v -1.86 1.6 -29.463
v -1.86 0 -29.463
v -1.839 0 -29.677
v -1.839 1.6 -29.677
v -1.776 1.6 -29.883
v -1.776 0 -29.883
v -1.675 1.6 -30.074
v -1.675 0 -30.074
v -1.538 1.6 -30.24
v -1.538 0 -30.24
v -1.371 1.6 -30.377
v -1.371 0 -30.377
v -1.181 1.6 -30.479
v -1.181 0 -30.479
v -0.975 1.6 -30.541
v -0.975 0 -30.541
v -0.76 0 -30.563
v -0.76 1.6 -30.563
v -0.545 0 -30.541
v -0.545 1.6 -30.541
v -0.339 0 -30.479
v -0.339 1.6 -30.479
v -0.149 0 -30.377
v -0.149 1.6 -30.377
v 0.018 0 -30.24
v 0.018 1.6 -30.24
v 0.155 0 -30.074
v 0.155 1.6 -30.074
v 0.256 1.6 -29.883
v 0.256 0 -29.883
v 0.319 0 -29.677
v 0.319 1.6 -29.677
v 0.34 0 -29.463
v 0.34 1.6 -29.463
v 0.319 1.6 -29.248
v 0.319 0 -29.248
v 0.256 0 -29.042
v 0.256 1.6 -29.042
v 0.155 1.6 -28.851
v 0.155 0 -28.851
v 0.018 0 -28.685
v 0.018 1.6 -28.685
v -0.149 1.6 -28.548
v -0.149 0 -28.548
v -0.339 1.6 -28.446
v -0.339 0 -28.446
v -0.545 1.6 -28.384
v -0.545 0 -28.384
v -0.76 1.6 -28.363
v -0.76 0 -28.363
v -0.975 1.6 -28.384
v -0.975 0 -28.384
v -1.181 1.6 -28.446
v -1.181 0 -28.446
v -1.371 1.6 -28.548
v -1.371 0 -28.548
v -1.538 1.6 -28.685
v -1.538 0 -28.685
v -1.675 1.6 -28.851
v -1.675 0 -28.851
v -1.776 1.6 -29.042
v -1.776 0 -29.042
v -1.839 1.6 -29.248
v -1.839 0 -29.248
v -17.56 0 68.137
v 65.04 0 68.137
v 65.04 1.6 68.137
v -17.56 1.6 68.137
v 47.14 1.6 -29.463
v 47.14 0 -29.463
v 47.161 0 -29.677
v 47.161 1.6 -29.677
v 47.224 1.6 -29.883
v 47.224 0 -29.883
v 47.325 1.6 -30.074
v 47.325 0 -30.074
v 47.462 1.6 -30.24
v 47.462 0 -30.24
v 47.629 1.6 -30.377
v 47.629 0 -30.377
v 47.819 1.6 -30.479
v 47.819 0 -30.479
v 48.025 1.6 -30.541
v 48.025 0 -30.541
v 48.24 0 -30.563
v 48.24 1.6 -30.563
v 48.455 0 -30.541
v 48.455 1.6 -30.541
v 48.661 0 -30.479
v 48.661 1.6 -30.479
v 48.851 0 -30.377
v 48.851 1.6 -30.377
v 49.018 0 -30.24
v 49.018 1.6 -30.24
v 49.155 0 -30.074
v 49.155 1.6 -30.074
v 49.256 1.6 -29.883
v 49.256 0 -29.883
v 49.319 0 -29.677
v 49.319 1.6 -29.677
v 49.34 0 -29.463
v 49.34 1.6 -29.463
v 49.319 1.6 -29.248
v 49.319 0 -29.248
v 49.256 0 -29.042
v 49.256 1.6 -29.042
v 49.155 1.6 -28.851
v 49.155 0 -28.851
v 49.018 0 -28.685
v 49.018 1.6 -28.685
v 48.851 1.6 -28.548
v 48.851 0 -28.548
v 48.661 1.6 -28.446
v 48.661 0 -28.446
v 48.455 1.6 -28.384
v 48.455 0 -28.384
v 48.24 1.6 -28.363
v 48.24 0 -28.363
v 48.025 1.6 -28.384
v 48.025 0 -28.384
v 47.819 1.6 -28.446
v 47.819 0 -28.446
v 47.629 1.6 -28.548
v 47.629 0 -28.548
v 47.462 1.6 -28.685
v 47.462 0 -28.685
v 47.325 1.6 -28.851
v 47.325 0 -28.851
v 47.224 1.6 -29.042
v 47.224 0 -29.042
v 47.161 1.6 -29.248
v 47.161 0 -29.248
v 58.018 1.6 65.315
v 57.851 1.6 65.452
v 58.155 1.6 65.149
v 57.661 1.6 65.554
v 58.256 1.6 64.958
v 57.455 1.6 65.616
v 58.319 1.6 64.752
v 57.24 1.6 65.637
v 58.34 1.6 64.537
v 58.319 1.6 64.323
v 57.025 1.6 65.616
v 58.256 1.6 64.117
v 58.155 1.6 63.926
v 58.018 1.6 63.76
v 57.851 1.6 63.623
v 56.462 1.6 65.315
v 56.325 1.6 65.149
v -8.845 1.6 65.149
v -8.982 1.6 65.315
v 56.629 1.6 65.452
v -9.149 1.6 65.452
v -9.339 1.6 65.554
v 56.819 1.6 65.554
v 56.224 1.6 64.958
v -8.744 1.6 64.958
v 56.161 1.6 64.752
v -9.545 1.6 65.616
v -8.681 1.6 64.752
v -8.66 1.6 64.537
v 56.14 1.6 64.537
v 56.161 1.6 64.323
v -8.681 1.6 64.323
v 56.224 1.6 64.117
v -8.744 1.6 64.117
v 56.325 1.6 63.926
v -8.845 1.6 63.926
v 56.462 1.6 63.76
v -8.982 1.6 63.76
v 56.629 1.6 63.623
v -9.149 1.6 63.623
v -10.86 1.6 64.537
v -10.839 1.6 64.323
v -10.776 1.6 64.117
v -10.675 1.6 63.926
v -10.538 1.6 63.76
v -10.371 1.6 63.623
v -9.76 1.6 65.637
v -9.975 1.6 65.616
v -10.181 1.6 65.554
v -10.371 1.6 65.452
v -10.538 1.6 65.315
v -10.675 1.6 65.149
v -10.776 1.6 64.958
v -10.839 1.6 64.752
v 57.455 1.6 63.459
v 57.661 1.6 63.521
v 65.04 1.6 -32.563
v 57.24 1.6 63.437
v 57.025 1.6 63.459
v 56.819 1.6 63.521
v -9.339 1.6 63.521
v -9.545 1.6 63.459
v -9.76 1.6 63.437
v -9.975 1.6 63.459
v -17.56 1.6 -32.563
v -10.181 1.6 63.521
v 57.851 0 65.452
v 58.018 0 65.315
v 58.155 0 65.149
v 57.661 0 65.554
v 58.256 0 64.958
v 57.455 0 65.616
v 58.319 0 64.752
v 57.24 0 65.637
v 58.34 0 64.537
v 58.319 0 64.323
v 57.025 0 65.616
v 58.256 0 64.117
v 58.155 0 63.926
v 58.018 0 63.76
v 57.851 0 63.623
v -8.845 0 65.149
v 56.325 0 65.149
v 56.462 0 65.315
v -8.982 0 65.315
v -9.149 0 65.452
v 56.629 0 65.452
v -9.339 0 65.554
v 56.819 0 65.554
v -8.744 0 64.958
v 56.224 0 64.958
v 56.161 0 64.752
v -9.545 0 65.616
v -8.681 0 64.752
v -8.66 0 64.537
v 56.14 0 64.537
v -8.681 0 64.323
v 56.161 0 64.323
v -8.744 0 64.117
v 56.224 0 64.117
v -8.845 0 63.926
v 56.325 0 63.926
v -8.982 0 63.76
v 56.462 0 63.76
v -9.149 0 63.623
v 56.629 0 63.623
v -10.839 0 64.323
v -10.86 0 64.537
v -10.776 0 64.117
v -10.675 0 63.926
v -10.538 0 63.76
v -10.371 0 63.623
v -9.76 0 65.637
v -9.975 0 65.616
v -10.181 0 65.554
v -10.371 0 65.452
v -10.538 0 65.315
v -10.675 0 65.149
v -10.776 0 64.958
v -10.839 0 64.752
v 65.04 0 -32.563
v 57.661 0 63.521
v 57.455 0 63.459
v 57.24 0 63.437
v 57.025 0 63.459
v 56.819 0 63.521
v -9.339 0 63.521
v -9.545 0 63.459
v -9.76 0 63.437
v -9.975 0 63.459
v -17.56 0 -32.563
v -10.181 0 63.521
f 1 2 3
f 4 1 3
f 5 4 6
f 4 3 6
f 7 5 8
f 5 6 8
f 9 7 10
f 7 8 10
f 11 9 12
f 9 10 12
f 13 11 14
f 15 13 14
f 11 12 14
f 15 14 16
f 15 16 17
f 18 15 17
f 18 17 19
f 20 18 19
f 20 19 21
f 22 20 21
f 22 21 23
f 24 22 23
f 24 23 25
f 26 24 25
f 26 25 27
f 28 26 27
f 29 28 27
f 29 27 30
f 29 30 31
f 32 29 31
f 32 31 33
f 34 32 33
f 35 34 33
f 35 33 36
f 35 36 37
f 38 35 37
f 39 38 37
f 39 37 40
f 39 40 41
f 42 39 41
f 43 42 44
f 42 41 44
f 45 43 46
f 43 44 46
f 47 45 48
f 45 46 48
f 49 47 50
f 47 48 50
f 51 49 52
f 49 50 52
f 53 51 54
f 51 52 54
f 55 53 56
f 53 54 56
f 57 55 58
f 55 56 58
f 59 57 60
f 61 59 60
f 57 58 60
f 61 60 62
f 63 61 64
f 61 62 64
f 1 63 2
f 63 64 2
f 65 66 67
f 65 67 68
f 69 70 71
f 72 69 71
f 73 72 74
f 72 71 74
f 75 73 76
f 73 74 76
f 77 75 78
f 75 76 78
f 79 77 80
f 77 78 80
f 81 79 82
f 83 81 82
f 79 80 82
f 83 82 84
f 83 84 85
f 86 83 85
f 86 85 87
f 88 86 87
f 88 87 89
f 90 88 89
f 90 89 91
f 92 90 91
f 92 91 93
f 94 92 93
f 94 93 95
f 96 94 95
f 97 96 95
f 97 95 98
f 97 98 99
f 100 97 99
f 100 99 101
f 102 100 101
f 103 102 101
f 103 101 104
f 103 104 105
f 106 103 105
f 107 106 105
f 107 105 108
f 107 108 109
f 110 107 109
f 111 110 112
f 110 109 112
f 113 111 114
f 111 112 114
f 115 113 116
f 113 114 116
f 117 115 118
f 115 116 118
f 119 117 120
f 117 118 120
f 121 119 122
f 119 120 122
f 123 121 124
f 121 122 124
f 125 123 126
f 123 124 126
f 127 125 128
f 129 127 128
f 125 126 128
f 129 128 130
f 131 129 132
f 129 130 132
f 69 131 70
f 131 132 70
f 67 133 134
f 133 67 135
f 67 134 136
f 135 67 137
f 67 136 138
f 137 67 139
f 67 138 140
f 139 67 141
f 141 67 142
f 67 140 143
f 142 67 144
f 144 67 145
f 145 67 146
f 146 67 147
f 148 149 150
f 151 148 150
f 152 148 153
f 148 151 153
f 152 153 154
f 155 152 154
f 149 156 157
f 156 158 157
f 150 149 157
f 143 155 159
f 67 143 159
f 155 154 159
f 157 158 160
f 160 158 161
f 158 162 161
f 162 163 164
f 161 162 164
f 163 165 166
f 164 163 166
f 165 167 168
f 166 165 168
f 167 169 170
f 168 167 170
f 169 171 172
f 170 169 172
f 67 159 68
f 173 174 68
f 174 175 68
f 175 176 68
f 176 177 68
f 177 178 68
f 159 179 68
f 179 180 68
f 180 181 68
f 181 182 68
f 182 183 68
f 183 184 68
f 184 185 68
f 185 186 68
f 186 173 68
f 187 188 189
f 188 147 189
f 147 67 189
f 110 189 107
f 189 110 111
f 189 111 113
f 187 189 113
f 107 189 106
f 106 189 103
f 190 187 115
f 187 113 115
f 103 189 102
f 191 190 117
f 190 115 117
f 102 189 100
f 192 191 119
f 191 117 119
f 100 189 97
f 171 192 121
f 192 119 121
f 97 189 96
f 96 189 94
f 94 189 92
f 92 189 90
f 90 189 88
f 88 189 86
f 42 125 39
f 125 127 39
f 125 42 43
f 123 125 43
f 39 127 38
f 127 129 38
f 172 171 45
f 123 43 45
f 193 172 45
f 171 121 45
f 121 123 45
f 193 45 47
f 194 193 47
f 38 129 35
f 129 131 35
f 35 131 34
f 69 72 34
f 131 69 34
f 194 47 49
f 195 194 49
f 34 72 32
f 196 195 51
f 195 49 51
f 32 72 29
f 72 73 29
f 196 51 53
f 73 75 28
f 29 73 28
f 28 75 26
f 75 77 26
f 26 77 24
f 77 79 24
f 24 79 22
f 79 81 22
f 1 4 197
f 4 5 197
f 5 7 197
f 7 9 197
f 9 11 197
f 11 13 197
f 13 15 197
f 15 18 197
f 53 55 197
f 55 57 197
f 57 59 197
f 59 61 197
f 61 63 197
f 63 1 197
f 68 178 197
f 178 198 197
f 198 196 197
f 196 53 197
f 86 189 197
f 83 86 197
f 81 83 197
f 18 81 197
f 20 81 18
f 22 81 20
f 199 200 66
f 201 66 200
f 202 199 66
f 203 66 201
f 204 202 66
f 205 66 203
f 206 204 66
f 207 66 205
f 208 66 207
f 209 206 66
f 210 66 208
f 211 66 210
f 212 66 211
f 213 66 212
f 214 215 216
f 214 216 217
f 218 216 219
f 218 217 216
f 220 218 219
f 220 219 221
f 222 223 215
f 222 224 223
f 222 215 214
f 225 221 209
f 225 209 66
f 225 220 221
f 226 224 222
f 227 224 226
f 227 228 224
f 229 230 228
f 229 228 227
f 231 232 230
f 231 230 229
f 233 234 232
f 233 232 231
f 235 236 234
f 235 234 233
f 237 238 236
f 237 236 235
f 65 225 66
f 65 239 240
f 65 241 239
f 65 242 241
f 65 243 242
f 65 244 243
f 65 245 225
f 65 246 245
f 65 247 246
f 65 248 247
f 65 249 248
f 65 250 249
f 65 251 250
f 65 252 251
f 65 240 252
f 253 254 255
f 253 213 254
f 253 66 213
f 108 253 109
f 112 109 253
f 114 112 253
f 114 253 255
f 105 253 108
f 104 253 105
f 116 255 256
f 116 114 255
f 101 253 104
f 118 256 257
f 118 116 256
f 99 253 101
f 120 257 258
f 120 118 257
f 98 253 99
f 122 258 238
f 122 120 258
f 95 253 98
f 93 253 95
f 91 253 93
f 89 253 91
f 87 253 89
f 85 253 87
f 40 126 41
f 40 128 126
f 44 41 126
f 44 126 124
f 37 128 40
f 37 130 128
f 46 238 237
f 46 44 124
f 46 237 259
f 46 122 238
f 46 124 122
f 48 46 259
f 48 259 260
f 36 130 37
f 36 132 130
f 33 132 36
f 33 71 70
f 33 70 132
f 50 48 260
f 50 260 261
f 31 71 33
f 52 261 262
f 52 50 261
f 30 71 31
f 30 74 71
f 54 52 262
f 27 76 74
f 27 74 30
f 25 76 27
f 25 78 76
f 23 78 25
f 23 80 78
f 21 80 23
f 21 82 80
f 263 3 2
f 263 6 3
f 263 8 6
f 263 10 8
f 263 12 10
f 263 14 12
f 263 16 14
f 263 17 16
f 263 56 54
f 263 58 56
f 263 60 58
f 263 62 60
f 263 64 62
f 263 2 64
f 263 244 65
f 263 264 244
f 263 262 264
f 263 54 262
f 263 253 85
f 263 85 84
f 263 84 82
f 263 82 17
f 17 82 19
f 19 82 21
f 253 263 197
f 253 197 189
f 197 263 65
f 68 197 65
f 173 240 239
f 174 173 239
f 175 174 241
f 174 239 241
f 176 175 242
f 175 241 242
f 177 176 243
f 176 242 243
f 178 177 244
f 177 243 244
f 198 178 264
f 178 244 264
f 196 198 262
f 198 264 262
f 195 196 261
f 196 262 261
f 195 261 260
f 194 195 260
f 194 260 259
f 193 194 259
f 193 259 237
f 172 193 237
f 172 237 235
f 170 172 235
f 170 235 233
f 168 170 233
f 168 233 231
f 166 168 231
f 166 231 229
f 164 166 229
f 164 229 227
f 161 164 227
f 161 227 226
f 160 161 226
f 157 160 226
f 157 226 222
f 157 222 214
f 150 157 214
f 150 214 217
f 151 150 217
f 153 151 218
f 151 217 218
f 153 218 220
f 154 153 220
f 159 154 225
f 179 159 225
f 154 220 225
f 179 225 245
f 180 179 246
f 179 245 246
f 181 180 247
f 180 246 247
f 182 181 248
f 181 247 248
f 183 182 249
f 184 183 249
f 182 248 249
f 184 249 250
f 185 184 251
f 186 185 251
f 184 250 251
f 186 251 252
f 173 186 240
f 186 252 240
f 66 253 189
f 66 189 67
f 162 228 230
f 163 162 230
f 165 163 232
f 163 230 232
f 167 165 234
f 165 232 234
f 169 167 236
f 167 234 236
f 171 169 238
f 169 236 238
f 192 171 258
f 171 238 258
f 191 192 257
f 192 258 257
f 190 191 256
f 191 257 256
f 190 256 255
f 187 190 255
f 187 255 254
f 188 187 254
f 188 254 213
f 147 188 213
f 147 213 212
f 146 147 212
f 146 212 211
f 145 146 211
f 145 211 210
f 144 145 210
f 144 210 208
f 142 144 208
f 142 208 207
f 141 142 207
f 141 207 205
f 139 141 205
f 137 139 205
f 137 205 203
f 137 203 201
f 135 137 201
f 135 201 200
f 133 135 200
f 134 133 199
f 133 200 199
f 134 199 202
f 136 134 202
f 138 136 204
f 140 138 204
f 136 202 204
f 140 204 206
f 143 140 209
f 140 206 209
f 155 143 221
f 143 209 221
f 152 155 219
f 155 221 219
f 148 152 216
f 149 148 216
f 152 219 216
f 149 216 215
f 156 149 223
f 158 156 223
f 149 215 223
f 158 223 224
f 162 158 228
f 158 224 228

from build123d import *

# Parameters (mm, degrees)
BOSS_EXTRUDE1_DEPTH            = 1.6
F_2_2_2_2_DIAMETER_HOLE2_D     = 2.2
F_2_2_2_2_DIAMETER_HOLE1_D     = 2.2
F_2_2_2_2_DIAMETER_HOLE1_DEPTH = 2
SKETCH7_W                      = 0.2
SKETCH7_H                      = 100.7
EXTRUDE1_DEPTH                 = 2.6


with BuildPart() as part:
    # Sketch1 → Boss-Extrude1 (new body)
    with BuildSketch(Plane(origin=(0, 0, 0), x_dir=(1, 0, 0), z_dir=(0, 1, 0))):
        Polygon((65.24, 10.562547362), (65.24, -54.937452638), (65.24, -68.137452638), (-17.76, -68.137452638), (-17.76, -46.137452638), (-17.76, 19.362547362), (-17.76, 32.562547362), (65.24, 32.562547362), align=None)
    extrude(amount=BOSS_EXTRUDE1_DEPTH)

    # Ø2.2 (2.2) Diameter Hole2 (through all)
    with Locations(Plane(origin=(0, 1.6, 0), x_dir=(1, 0, 0), z_dir=(0, 1, 0))):
        with Locations((-0.76, 29.462547362), (48.24, 29.462547362)):
            Hole(F_2_2_2_2_DIAMETER_HOLE2_D / 2)

    # Ø2.2 (2.2) Diameter Hole1
    with Locations(Plane(origin=(0, 1.6, 0), x_dir=(1, 0, 0), z_dir=(0, 1, 0))):
        with Locations((-9.76, -64.537452638), (57.24, -64.537452638)):
            Hole(F_2_2_2_2_DIAMETER_HOLE1_D / 2, depth=F_2_2_2_2_DIAMETER_HOLE1_DEPTH)

    # Sketch7 → Extrude1 (cut, through all)
    with BuildSketch(Plane.XZ):
        with Locations((-17.66, 17.787452638)):
            Rectangle(SKETCH7_W, SKETCH7_H)
        with Locations((65.14, 17.787452638)):
            Rectangle(SKETCH7_W, SKETCH7_H)
    extrude(amount=-EXTRUDE1_DEPTH, mode=Mode.SUBTRACT)


solid = part.part
